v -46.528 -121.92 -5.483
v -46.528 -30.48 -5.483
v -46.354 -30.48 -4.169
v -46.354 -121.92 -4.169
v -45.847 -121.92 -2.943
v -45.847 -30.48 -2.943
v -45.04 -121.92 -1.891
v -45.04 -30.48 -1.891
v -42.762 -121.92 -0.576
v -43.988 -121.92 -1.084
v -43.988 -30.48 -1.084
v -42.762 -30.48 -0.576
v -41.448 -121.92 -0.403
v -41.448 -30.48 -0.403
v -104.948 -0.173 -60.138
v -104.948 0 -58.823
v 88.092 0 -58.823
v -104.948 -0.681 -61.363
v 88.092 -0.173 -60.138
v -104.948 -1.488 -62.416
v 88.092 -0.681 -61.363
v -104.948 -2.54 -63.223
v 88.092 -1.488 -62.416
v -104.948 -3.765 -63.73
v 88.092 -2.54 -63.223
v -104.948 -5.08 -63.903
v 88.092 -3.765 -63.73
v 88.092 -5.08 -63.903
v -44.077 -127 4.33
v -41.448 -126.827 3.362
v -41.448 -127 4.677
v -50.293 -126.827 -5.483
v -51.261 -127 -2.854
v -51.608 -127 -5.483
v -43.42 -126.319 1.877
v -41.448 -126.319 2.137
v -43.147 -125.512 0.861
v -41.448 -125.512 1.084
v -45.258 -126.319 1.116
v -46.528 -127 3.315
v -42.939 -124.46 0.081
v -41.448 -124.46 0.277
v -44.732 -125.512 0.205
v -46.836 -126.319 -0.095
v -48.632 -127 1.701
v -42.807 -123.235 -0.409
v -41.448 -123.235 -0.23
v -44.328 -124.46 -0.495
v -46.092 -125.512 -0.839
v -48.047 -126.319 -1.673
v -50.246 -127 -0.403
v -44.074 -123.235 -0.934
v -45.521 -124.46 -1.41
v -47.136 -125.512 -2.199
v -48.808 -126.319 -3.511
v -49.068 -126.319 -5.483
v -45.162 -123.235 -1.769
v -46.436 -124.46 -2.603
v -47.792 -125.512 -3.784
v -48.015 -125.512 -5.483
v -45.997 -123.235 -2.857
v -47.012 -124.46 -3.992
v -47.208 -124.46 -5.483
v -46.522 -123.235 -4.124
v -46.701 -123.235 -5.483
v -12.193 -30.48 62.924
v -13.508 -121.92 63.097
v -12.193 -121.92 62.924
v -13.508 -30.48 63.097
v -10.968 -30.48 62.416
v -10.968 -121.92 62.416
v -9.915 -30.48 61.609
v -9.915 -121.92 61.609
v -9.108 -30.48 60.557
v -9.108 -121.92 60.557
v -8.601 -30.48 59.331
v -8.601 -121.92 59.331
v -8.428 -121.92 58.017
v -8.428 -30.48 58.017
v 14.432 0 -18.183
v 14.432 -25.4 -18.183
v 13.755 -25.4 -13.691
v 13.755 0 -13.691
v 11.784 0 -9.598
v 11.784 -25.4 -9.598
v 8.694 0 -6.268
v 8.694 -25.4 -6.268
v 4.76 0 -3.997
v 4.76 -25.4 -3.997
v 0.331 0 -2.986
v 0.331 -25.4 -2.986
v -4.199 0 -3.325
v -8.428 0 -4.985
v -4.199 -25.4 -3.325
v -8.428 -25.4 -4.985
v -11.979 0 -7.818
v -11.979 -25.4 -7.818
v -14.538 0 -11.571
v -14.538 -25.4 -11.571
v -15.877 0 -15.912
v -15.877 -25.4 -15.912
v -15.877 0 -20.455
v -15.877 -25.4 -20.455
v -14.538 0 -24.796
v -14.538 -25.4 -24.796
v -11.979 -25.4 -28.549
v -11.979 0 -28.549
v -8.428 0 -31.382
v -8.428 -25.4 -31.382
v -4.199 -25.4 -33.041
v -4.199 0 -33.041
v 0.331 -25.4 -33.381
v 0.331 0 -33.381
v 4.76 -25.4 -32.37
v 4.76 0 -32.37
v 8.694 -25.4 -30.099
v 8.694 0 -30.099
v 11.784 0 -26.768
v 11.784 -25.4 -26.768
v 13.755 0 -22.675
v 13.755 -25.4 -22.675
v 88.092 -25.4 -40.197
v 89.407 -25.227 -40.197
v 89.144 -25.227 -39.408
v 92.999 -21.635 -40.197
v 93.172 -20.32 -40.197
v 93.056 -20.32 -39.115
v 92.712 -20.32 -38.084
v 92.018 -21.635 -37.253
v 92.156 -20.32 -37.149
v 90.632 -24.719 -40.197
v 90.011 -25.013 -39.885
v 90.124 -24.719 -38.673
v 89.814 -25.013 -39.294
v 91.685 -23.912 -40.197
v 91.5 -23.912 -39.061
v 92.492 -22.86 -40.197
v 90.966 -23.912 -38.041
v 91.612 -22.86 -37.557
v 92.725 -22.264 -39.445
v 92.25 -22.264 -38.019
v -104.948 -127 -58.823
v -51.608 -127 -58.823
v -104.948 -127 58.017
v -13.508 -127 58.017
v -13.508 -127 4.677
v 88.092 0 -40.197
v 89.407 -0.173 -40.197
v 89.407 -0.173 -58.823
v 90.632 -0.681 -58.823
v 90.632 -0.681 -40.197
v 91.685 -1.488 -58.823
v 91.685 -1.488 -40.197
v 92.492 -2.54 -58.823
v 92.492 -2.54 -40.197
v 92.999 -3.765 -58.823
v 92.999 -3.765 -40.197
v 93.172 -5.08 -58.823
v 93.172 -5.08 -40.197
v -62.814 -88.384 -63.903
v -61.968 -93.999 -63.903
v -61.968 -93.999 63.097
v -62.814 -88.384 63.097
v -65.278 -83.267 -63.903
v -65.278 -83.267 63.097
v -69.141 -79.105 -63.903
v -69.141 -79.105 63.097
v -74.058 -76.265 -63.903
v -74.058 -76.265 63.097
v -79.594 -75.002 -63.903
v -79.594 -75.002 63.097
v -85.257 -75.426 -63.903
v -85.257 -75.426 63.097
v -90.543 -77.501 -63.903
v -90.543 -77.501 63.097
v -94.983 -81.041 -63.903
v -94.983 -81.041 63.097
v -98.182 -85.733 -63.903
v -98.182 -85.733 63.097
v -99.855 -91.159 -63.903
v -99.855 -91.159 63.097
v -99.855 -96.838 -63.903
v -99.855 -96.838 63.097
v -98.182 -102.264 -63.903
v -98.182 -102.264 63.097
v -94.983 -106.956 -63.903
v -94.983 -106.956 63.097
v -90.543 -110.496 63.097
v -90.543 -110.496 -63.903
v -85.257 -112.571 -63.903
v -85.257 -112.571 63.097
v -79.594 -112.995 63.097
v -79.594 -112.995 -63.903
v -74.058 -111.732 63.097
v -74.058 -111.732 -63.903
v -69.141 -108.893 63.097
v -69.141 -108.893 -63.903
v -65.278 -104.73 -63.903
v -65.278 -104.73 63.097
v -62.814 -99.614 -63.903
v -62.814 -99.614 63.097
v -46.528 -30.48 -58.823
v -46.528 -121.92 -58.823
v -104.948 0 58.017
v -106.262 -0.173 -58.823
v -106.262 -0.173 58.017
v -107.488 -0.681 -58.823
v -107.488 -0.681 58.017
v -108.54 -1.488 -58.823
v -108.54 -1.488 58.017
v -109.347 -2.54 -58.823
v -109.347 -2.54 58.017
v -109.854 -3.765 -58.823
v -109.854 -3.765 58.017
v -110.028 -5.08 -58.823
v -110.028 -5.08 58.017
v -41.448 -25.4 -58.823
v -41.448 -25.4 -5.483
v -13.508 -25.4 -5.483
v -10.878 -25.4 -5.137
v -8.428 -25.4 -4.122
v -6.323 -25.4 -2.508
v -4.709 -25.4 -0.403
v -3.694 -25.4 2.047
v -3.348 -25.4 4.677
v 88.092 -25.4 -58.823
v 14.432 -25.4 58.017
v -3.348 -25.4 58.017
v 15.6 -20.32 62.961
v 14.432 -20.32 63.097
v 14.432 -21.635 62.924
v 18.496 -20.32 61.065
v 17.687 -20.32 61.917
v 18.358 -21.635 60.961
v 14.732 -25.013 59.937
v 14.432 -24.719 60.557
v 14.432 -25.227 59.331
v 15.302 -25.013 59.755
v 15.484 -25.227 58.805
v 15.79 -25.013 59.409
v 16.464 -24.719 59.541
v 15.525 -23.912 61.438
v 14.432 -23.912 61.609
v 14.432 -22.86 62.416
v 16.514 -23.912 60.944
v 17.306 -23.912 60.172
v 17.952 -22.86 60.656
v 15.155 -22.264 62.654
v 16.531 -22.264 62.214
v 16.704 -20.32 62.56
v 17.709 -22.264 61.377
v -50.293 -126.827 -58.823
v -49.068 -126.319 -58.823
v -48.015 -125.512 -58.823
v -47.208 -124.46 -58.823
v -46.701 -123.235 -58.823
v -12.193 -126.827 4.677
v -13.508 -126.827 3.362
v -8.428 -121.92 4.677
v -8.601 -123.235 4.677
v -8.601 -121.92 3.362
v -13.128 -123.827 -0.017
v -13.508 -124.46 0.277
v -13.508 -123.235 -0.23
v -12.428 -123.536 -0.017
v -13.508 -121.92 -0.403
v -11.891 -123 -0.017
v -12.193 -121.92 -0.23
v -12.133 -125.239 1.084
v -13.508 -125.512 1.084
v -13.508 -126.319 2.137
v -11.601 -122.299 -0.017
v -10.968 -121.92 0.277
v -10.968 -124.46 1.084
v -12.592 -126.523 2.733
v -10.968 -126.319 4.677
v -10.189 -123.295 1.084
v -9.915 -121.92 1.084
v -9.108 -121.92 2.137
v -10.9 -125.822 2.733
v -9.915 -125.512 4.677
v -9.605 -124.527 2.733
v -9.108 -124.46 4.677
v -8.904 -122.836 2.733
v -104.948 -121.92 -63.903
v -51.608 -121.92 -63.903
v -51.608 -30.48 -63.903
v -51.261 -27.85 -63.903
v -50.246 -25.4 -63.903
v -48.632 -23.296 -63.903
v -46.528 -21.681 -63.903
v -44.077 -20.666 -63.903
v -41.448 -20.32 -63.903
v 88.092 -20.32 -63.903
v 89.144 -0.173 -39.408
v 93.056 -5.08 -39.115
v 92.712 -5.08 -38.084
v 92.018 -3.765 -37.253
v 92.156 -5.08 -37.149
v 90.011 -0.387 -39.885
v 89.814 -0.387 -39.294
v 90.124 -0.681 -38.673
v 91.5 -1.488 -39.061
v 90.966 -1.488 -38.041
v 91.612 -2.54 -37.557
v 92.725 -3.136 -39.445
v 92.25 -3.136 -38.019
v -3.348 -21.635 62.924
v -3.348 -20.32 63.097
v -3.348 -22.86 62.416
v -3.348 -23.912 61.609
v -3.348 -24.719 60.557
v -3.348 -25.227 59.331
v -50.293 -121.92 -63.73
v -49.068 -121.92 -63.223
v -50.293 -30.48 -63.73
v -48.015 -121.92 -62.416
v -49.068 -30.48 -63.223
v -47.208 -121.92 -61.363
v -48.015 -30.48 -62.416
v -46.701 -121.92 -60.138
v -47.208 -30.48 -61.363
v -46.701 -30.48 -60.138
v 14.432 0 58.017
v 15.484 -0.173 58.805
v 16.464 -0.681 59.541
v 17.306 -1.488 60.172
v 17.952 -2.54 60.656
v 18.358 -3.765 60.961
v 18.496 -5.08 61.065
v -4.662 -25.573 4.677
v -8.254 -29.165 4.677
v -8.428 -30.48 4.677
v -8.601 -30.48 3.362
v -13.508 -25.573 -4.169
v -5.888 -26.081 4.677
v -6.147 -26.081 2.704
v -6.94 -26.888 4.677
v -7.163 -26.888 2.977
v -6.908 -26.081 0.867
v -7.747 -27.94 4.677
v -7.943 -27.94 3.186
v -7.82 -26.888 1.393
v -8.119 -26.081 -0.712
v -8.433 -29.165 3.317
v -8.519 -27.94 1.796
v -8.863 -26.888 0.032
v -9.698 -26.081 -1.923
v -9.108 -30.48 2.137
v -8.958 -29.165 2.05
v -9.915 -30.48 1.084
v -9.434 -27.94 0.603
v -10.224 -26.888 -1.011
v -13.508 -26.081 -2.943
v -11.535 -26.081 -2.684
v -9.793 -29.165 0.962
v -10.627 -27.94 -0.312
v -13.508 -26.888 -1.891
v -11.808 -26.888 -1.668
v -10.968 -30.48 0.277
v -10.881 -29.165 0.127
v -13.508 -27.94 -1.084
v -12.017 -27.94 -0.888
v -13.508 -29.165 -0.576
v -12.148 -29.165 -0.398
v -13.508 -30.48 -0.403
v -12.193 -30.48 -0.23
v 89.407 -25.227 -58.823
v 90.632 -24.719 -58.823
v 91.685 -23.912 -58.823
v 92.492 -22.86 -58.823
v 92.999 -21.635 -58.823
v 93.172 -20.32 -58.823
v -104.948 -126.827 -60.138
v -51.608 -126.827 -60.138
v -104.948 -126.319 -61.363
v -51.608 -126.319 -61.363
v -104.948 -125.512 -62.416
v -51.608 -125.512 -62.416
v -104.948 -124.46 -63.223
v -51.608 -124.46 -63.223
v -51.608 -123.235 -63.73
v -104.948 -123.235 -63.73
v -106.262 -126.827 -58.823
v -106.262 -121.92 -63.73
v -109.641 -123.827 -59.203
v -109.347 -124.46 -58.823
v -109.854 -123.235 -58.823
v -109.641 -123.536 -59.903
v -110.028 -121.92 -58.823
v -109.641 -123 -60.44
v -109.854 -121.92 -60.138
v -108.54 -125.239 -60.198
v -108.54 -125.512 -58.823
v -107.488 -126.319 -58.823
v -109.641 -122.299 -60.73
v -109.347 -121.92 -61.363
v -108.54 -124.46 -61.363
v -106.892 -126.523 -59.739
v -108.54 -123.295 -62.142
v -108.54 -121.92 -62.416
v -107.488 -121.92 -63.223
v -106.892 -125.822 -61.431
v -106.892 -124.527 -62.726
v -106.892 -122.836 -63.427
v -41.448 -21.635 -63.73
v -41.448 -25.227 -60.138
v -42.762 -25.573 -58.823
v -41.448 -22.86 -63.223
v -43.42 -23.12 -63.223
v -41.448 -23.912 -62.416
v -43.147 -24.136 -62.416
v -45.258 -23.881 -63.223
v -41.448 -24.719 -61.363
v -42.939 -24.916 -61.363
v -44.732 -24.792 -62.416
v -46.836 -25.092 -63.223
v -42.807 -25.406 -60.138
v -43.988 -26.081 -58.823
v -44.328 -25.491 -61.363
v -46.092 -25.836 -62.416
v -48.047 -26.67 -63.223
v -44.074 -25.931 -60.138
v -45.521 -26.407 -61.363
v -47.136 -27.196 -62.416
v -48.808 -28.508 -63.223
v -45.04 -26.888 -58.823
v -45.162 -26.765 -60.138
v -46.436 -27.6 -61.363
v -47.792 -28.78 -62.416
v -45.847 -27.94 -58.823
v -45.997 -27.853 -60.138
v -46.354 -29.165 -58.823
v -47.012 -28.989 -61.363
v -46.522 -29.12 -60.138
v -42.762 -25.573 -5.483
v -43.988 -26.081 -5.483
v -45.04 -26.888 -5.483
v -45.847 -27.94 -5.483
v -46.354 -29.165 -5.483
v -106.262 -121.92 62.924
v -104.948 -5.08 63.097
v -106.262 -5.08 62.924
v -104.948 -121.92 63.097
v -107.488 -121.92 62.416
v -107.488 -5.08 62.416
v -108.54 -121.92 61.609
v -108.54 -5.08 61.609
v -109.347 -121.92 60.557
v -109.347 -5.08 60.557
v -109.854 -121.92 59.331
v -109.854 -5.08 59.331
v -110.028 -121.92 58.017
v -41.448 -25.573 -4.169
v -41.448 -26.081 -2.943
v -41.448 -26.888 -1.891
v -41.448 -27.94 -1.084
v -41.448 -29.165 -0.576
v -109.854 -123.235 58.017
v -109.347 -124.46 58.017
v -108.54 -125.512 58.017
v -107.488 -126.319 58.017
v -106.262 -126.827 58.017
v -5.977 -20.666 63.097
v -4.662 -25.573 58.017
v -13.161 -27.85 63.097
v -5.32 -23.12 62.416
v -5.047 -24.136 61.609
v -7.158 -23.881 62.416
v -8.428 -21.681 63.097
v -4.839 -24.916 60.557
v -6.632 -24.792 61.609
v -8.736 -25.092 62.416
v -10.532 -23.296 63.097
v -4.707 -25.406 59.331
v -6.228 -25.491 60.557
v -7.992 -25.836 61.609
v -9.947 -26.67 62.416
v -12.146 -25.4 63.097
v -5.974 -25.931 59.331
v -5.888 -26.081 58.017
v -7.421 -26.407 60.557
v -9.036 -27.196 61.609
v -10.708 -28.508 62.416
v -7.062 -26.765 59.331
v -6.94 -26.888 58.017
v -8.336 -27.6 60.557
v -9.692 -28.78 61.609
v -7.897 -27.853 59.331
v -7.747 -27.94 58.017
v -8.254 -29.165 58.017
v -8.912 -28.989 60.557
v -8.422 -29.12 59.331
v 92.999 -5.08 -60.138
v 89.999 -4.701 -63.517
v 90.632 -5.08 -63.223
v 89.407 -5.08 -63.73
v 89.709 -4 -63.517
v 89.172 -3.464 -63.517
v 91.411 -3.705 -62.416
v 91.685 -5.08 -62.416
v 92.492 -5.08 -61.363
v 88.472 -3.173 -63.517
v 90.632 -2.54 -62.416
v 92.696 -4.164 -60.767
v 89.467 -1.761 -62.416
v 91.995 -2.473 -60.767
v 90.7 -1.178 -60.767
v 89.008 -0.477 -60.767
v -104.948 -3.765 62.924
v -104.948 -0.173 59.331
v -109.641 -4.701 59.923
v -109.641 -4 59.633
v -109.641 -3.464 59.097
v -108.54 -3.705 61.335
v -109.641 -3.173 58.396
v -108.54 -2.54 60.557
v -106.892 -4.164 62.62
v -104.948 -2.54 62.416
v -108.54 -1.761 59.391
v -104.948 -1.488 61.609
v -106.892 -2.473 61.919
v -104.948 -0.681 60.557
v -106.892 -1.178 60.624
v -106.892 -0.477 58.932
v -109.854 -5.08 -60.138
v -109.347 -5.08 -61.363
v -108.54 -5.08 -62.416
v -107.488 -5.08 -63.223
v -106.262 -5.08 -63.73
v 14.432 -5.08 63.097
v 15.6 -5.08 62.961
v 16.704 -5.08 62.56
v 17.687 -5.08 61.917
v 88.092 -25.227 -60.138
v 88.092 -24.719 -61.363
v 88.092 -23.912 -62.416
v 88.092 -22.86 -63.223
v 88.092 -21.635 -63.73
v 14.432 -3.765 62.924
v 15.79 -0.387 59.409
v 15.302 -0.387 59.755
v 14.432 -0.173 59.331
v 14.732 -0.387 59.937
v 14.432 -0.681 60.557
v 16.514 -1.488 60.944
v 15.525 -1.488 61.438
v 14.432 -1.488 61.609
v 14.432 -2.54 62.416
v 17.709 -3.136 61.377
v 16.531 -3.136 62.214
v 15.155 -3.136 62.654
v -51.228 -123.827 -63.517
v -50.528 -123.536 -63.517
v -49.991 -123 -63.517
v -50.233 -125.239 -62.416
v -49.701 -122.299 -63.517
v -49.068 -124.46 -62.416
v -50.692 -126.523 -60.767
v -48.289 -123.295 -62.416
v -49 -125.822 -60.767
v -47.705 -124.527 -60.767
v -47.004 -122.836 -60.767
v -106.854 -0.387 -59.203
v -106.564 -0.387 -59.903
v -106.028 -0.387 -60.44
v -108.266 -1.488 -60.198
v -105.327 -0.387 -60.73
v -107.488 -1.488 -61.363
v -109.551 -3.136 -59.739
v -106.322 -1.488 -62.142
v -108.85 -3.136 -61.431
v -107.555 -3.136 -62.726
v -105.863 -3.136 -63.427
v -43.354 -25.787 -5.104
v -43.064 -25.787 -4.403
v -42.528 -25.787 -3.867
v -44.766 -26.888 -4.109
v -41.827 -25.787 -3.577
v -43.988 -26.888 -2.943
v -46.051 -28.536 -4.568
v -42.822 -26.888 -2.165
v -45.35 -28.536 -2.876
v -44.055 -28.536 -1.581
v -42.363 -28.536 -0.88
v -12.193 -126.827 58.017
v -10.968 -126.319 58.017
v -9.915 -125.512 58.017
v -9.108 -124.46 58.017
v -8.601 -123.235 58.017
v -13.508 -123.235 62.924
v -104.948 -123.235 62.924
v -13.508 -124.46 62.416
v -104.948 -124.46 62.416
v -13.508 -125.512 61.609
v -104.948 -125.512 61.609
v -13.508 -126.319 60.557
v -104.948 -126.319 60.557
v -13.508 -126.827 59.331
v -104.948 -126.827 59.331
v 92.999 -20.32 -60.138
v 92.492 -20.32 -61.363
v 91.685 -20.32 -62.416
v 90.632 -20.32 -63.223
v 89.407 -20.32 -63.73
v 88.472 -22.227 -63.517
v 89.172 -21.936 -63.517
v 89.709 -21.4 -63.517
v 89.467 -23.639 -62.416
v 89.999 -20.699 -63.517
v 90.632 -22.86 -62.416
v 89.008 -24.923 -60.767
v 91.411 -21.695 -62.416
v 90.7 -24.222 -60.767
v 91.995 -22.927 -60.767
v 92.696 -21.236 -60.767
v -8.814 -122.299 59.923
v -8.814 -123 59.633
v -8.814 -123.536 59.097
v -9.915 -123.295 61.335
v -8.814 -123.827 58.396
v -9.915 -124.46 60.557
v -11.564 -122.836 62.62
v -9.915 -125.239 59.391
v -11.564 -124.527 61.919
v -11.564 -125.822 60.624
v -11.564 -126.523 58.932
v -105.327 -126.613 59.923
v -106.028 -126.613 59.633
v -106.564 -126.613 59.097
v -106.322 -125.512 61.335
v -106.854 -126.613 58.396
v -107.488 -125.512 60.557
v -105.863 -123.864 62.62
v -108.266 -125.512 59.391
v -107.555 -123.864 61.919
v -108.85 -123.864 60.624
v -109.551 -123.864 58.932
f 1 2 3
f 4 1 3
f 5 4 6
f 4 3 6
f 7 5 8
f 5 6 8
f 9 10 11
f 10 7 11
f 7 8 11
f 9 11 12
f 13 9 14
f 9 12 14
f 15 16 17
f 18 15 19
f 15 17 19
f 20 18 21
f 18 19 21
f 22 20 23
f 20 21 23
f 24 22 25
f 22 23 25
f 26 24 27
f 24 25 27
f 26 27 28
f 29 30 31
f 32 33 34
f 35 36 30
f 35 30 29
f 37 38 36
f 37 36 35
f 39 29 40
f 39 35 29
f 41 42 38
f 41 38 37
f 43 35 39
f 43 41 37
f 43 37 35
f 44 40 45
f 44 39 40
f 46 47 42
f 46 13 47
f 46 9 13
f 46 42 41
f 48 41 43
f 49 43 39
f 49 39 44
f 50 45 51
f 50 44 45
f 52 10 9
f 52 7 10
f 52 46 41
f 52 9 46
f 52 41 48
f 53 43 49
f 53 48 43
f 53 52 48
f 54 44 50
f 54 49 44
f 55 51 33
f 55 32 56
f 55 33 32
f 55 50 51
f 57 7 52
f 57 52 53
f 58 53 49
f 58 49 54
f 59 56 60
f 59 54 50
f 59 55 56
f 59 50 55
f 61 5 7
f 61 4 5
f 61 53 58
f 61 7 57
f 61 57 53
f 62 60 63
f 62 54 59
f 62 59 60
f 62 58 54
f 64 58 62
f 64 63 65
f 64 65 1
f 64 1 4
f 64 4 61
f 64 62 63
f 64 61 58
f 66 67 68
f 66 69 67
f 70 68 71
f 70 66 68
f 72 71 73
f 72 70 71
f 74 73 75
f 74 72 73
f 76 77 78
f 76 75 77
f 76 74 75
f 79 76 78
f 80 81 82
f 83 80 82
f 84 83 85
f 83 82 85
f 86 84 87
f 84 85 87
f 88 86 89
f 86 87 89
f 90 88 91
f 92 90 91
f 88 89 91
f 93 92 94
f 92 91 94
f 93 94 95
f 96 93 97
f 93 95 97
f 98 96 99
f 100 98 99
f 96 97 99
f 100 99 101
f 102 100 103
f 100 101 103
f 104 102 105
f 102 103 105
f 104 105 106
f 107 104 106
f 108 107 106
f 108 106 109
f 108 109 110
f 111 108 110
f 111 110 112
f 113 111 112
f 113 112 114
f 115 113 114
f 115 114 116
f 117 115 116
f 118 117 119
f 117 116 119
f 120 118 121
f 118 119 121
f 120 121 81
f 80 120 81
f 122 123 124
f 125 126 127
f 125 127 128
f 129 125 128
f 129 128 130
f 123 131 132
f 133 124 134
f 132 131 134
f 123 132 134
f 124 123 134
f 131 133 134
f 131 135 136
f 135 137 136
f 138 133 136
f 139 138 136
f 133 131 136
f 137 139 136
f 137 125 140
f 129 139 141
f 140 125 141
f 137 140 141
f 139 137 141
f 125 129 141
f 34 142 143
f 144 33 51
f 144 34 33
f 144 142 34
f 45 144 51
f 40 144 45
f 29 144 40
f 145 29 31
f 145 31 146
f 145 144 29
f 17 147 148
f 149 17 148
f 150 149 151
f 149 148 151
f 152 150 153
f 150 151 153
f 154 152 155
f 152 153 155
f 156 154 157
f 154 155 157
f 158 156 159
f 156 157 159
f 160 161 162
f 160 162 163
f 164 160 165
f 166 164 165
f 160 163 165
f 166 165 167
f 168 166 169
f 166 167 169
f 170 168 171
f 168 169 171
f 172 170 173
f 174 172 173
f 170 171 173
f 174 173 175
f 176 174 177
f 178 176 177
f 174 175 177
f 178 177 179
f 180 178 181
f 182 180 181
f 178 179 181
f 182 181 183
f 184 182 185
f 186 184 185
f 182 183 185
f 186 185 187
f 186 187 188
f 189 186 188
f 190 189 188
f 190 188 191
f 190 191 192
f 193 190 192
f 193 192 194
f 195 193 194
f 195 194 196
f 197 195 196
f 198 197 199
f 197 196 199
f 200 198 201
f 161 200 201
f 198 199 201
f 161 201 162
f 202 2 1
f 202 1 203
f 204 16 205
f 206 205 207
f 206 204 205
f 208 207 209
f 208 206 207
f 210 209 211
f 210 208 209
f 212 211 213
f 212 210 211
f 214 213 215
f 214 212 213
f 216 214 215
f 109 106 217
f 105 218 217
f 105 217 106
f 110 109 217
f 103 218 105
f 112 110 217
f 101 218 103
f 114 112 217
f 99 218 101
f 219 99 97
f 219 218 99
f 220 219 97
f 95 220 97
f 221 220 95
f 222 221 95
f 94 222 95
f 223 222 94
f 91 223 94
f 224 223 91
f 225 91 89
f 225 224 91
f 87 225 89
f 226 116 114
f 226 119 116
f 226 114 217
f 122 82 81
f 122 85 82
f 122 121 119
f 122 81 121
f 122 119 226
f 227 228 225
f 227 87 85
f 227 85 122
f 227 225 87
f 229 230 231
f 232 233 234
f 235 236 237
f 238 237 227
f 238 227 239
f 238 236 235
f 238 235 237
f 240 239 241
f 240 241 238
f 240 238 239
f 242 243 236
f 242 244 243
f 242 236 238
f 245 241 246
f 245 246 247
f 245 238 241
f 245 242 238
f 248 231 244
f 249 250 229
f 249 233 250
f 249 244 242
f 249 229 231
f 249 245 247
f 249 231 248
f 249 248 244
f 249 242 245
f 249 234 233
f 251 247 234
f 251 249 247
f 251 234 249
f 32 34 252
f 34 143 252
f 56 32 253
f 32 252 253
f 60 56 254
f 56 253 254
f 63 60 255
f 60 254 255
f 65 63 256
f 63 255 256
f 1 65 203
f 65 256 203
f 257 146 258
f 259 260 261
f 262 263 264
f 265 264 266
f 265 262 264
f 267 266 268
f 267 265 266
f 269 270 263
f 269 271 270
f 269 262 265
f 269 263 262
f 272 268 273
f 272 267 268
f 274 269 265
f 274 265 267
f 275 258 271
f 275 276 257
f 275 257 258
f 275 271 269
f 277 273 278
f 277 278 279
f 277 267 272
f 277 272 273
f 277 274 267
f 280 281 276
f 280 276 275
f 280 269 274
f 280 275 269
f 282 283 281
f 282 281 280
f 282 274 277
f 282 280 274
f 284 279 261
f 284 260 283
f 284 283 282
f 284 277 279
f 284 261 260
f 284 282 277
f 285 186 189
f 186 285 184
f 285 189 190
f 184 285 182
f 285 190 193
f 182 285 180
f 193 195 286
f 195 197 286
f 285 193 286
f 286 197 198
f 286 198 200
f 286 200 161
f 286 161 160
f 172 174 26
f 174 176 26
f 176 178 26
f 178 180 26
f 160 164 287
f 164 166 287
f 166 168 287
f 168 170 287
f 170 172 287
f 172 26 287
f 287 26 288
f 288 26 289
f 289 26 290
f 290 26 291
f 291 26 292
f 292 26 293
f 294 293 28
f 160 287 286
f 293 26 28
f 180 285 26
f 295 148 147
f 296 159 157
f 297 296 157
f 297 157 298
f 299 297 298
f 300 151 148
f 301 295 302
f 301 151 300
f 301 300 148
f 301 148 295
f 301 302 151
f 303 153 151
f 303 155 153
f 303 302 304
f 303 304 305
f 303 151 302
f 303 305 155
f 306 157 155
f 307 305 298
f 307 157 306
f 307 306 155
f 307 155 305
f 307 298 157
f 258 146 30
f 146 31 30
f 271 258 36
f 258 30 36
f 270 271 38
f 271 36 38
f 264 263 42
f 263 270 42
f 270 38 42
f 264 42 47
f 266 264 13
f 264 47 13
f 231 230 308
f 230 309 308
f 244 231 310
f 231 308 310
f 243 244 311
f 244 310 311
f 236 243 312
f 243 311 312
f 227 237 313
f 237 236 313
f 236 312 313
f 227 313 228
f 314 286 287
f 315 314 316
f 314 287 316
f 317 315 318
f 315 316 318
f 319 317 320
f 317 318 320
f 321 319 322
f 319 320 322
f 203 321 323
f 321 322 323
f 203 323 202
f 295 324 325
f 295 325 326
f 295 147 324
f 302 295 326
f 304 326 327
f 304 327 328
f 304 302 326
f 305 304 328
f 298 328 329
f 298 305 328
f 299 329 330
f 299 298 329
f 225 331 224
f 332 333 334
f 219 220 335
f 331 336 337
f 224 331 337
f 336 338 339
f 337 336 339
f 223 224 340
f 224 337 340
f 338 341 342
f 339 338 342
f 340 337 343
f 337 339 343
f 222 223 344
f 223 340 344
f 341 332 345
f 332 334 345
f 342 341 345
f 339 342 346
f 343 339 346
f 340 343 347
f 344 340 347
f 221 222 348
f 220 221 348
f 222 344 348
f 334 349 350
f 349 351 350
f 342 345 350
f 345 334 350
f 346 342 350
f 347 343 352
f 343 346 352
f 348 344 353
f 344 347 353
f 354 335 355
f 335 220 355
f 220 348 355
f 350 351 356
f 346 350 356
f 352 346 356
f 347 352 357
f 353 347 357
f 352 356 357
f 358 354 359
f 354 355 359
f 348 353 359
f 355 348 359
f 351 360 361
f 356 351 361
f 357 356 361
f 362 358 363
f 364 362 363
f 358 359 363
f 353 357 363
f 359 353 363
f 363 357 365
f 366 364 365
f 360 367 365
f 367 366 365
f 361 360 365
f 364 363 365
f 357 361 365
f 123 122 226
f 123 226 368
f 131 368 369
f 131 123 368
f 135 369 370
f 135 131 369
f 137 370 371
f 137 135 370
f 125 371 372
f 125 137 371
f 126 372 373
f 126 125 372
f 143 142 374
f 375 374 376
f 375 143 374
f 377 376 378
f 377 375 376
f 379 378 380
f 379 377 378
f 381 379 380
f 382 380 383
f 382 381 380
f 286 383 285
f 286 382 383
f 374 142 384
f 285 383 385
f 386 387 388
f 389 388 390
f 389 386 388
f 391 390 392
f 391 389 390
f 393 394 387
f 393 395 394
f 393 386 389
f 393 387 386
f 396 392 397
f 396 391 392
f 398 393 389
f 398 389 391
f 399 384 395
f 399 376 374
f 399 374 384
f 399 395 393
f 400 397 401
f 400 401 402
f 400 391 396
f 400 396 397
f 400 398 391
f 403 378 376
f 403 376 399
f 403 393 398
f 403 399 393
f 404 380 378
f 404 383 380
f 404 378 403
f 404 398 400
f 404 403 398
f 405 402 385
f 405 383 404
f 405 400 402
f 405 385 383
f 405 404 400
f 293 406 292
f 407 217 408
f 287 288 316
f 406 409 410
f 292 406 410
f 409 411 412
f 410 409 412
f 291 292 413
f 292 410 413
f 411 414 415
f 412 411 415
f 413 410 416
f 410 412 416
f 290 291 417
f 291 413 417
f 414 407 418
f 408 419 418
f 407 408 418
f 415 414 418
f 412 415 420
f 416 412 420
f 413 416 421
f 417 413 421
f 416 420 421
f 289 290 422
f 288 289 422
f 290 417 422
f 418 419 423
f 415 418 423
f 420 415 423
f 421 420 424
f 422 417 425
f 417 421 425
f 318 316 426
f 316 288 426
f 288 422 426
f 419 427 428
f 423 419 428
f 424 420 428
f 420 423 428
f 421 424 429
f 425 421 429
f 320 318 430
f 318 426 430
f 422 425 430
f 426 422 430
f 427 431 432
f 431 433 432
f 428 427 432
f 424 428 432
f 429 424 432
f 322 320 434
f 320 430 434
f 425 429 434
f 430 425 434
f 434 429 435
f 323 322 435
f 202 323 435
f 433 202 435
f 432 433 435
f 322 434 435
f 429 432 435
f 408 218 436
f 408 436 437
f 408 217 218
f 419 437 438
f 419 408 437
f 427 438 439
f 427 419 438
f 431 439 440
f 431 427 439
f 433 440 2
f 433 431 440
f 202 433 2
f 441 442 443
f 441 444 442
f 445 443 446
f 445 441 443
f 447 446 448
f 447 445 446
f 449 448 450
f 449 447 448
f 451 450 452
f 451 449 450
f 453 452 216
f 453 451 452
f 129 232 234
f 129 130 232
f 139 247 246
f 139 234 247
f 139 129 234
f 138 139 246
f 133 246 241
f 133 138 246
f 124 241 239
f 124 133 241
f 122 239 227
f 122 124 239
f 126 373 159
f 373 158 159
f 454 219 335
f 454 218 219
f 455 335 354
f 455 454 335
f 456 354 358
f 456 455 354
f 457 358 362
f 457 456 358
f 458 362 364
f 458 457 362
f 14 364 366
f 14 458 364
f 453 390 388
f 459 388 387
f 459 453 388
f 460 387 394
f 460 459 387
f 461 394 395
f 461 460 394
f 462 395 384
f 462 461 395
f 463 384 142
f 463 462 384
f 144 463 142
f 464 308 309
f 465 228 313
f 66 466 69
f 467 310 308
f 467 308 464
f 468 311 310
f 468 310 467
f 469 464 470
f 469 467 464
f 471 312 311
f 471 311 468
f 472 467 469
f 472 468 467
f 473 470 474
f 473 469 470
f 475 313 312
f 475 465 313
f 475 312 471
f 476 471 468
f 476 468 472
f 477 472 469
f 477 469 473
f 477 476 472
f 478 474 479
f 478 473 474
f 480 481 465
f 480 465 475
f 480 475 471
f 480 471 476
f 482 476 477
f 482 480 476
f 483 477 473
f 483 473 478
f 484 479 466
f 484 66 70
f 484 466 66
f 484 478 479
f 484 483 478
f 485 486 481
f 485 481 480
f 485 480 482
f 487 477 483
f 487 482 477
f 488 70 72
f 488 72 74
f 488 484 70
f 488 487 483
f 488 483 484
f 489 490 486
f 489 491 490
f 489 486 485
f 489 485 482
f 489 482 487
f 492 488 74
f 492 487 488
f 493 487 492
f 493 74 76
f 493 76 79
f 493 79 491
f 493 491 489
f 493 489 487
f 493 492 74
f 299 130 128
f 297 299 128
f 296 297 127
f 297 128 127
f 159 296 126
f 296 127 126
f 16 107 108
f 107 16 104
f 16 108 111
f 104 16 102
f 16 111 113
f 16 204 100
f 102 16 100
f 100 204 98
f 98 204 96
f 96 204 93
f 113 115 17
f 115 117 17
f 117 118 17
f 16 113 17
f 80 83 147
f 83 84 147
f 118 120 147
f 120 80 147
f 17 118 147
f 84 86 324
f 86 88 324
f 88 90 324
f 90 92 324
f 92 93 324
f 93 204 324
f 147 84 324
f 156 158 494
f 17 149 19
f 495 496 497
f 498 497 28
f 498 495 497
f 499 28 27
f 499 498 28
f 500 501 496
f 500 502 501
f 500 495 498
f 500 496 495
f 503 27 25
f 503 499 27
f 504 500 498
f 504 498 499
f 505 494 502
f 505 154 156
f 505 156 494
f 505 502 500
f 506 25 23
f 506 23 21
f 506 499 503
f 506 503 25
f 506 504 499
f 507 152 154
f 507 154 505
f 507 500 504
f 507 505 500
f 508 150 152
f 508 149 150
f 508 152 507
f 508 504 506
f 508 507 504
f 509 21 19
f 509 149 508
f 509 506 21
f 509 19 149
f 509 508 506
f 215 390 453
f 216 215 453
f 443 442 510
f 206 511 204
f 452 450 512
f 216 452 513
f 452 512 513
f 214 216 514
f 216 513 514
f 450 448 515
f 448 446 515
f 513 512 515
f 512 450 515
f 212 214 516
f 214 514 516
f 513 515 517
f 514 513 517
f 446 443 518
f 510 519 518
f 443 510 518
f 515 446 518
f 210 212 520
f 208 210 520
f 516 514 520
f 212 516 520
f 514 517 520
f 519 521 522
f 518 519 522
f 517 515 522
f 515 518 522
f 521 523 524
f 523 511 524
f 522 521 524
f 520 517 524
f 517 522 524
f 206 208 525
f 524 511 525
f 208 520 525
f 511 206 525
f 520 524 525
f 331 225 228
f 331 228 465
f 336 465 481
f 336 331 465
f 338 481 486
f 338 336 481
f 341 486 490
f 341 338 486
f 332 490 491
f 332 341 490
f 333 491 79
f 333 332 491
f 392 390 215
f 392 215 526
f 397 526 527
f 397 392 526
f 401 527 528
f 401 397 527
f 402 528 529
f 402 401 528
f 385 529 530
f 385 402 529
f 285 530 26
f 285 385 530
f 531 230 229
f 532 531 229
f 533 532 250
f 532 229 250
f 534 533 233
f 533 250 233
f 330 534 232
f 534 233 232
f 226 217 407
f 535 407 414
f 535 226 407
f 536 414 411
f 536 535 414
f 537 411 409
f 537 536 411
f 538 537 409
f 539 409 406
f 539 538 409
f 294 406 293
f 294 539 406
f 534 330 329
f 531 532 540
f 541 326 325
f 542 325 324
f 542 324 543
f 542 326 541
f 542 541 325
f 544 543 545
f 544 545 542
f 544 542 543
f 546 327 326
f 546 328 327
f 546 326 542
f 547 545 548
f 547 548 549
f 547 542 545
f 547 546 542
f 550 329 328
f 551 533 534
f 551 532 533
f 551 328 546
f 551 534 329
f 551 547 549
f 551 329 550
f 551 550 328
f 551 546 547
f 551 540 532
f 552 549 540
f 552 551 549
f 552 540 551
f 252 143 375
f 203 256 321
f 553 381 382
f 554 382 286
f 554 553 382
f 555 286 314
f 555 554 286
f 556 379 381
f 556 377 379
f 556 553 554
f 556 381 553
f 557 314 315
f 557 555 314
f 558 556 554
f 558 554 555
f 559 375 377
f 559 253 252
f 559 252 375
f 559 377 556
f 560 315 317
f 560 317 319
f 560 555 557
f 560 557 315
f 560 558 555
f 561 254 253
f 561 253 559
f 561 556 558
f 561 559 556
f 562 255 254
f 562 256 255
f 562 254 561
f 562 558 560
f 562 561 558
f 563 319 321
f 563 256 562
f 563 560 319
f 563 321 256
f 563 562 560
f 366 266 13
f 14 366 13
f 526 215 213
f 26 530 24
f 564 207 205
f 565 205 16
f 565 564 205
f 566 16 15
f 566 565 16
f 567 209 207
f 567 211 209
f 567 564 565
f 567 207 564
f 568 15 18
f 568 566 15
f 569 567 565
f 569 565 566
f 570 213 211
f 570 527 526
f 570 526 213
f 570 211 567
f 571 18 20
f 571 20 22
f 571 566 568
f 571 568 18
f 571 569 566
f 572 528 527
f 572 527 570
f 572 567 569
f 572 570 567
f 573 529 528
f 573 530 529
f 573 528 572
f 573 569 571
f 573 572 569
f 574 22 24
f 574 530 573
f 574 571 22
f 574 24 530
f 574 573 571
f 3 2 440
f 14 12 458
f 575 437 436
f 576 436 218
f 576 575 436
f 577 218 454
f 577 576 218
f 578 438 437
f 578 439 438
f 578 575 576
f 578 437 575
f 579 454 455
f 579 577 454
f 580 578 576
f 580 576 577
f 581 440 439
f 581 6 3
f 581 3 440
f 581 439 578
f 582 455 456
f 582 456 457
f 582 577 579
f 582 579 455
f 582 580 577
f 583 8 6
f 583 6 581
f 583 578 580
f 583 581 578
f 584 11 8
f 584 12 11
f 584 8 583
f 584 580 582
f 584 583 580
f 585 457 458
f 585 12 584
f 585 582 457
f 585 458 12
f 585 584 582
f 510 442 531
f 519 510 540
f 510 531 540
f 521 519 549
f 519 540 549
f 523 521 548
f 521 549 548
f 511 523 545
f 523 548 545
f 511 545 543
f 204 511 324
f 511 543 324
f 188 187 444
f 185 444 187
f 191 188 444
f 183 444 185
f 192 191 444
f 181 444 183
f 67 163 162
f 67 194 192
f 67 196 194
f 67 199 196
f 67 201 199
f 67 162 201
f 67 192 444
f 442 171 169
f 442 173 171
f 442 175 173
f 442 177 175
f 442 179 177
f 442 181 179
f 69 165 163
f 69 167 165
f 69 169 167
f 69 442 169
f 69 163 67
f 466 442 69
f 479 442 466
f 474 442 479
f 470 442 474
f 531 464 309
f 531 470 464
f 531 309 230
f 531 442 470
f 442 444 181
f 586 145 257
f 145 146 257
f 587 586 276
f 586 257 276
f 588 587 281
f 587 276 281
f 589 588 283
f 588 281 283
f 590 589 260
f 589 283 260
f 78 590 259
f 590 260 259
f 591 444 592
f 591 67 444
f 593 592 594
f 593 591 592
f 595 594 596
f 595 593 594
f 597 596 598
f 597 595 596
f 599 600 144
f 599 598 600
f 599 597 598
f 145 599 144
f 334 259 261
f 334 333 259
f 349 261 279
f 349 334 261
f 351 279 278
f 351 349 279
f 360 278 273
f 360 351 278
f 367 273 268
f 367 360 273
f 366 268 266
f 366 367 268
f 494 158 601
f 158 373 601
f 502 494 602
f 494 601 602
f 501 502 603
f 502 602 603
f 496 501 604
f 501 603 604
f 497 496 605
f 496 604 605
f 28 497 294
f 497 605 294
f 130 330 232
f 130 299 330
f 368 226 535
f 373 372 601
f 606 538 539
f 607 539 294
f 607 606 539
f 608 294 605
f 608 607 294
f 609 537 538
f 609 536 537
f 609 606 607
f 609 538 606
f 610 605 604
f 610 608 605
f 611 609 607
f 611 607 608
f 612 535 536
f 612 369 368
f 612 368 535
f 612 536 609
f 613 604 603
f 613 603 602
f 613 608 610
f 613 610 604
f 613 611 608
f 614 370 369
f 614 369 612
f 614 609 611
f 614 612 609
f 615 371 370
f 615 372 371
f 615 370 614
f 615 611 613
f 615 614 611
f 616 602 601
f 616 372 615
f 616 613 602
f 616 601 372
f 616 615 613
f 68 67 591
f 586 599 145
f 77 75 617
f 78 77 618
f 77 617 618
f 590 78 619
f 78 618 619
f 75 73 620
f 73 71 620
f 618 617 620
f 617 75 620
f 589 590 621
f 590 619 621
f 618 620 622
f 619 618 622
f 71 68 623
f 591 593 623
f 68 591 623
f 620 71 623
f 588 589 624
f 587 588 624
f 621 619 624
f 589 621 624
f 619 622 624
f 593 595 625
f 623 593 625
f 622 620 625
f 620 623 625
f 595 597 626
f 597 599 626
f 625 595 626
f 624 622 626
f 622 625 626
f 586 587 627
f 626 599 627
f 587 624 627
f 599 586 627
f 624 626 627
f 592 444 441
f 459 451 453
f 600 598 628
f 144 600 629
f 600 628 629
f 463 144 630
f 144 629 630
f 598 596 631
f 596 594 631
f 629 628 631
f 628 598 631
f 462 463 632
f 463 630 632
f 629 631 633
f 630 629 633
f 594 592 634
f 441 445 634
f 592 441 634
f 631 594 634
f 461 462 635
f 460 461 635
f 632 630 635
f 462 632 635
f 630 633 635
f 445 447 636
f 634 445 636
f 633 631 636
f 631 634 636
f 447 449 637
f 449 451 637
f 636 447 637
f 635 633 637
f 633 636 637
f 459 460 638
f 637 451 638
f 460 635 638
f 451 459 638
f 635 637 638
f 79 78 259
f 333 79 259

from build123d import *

# Parameters (mm, degrees)
F0_W     = 203.2
F0_H     = 127
F1_DEPTH = 127
F3_DEPTH = 101.6
F4_SIZE2 = 101.6
F4_SIZE  = 76.2
F5_R     = 5.08
F6_R     = 15.24
F7_DEPTH = 25.4
F8_R     = 19.05
F9_DEPTH = 127


with BuildPart() as f1:
    # F0 (on Front) → F1 (new body)
    with BuildSketch(Plane.XZ):
        with Locations((-8.4275533497, -0.4033995528)):
            Rectangle(F0_W, F0_H)
    extrude(amount=F1_DEPTH)

    # F2 (on face) → F3 (cut)
    with BuildSketch(Plane.XZ.offset(127)):
        Polygon((-46.5275533497, -0.4033995528), (-46.5275533497, -63.9033995528), (93.1724466503, -63.9033995528), (93.1724466503, 63.0966004472), (-8.4275533497, 63.0966004472), (-8.4275533497, -0.4033995528), align=None)
    extrude(amount=-F3_DEPTH, mode=Mode.SUBTRACT)

    # F4
    f4_edges = [f1.edges().sort_by_distance(p)[0] for p in [
        (93.172447, -12.7, 63.0966),
    ]]
    f4_side = f1.faces().sort_by_distance((-42.29422, -55.033333, 63.0966))[0]
    chamfer(f4_edges, length=F4_SIZE, length2=F4_SIZE2, reference=f4_side)

    # F5
    f5_edges = [f1.edges().sort_by_distance(p)[0] for p in [
        (-46.527553, 0, 63.0966),
        (16.972447, -12.7, 63.0966),
        (-110.027553, -63.5, 63.0966),
        (4.272447, -25.4, 63.0966),
        (-59.227553, -127, 63.0966),
        (-8.427553, -76.2, 63.0966),
        (-8.427553, -127, 31.3466),
        (-27.477553, -127, -0.4034),
        (-46.527553, -127, -32.1534),
        (-78.277553, -127, -63.9034),
        (-110.027553, -127, -0.4034),
        (-8.427553, -76.2, -0.4034),
        (-8.427553, -25.4, 31.3466),
        (-46.527553, -76.2, -0.4034),
        (-46.527553, -76.2, -63.9034),
        (-46.527553, -25.4, -32.1534),
        (93.172447, -25.4, -51.2034),
        (55.072447, -25.4, 12.2966),
        (23.322447, -25.4, -63.9034),
        (-27.477553, -25.4, -0.4034),
        (55.072447, 0, 12.2966),
        (93.172447, -12.7, -38.5034),
        (93.172447, 0, -51.2034),
        (93.172447, -12.7, -63.9034),
        (-110.027553, -63.5, -63.9034),
        (-110.027553, 0, -0.4034),
        (-8.427553, 0, -63.9034),
    ]]
    fillet(f5_edges, radius=F5_R)

    # F6 (on face) → F7 (cut, through all)
    with BuildSketch(Plane.XZ.offset(25.4)):
        with Locations((-0.8075533497, -18.1833995528)):
            Circle(F6_R)
    extrude(amount=-F7_DEPTH, mode=Mode.SUBTRACT)

    # F8 (on face) → F9 (cut, through all)
    with BuildSketch(Plane.XY.offset(63.0966004472)):
        with Locations((-81.0180455446, -93.9986258745)):
            Circle(F8_R)
    extrude(amount=-F9_DEPTH, mode=Mode.SUBTRACT)


solid = f1.part
